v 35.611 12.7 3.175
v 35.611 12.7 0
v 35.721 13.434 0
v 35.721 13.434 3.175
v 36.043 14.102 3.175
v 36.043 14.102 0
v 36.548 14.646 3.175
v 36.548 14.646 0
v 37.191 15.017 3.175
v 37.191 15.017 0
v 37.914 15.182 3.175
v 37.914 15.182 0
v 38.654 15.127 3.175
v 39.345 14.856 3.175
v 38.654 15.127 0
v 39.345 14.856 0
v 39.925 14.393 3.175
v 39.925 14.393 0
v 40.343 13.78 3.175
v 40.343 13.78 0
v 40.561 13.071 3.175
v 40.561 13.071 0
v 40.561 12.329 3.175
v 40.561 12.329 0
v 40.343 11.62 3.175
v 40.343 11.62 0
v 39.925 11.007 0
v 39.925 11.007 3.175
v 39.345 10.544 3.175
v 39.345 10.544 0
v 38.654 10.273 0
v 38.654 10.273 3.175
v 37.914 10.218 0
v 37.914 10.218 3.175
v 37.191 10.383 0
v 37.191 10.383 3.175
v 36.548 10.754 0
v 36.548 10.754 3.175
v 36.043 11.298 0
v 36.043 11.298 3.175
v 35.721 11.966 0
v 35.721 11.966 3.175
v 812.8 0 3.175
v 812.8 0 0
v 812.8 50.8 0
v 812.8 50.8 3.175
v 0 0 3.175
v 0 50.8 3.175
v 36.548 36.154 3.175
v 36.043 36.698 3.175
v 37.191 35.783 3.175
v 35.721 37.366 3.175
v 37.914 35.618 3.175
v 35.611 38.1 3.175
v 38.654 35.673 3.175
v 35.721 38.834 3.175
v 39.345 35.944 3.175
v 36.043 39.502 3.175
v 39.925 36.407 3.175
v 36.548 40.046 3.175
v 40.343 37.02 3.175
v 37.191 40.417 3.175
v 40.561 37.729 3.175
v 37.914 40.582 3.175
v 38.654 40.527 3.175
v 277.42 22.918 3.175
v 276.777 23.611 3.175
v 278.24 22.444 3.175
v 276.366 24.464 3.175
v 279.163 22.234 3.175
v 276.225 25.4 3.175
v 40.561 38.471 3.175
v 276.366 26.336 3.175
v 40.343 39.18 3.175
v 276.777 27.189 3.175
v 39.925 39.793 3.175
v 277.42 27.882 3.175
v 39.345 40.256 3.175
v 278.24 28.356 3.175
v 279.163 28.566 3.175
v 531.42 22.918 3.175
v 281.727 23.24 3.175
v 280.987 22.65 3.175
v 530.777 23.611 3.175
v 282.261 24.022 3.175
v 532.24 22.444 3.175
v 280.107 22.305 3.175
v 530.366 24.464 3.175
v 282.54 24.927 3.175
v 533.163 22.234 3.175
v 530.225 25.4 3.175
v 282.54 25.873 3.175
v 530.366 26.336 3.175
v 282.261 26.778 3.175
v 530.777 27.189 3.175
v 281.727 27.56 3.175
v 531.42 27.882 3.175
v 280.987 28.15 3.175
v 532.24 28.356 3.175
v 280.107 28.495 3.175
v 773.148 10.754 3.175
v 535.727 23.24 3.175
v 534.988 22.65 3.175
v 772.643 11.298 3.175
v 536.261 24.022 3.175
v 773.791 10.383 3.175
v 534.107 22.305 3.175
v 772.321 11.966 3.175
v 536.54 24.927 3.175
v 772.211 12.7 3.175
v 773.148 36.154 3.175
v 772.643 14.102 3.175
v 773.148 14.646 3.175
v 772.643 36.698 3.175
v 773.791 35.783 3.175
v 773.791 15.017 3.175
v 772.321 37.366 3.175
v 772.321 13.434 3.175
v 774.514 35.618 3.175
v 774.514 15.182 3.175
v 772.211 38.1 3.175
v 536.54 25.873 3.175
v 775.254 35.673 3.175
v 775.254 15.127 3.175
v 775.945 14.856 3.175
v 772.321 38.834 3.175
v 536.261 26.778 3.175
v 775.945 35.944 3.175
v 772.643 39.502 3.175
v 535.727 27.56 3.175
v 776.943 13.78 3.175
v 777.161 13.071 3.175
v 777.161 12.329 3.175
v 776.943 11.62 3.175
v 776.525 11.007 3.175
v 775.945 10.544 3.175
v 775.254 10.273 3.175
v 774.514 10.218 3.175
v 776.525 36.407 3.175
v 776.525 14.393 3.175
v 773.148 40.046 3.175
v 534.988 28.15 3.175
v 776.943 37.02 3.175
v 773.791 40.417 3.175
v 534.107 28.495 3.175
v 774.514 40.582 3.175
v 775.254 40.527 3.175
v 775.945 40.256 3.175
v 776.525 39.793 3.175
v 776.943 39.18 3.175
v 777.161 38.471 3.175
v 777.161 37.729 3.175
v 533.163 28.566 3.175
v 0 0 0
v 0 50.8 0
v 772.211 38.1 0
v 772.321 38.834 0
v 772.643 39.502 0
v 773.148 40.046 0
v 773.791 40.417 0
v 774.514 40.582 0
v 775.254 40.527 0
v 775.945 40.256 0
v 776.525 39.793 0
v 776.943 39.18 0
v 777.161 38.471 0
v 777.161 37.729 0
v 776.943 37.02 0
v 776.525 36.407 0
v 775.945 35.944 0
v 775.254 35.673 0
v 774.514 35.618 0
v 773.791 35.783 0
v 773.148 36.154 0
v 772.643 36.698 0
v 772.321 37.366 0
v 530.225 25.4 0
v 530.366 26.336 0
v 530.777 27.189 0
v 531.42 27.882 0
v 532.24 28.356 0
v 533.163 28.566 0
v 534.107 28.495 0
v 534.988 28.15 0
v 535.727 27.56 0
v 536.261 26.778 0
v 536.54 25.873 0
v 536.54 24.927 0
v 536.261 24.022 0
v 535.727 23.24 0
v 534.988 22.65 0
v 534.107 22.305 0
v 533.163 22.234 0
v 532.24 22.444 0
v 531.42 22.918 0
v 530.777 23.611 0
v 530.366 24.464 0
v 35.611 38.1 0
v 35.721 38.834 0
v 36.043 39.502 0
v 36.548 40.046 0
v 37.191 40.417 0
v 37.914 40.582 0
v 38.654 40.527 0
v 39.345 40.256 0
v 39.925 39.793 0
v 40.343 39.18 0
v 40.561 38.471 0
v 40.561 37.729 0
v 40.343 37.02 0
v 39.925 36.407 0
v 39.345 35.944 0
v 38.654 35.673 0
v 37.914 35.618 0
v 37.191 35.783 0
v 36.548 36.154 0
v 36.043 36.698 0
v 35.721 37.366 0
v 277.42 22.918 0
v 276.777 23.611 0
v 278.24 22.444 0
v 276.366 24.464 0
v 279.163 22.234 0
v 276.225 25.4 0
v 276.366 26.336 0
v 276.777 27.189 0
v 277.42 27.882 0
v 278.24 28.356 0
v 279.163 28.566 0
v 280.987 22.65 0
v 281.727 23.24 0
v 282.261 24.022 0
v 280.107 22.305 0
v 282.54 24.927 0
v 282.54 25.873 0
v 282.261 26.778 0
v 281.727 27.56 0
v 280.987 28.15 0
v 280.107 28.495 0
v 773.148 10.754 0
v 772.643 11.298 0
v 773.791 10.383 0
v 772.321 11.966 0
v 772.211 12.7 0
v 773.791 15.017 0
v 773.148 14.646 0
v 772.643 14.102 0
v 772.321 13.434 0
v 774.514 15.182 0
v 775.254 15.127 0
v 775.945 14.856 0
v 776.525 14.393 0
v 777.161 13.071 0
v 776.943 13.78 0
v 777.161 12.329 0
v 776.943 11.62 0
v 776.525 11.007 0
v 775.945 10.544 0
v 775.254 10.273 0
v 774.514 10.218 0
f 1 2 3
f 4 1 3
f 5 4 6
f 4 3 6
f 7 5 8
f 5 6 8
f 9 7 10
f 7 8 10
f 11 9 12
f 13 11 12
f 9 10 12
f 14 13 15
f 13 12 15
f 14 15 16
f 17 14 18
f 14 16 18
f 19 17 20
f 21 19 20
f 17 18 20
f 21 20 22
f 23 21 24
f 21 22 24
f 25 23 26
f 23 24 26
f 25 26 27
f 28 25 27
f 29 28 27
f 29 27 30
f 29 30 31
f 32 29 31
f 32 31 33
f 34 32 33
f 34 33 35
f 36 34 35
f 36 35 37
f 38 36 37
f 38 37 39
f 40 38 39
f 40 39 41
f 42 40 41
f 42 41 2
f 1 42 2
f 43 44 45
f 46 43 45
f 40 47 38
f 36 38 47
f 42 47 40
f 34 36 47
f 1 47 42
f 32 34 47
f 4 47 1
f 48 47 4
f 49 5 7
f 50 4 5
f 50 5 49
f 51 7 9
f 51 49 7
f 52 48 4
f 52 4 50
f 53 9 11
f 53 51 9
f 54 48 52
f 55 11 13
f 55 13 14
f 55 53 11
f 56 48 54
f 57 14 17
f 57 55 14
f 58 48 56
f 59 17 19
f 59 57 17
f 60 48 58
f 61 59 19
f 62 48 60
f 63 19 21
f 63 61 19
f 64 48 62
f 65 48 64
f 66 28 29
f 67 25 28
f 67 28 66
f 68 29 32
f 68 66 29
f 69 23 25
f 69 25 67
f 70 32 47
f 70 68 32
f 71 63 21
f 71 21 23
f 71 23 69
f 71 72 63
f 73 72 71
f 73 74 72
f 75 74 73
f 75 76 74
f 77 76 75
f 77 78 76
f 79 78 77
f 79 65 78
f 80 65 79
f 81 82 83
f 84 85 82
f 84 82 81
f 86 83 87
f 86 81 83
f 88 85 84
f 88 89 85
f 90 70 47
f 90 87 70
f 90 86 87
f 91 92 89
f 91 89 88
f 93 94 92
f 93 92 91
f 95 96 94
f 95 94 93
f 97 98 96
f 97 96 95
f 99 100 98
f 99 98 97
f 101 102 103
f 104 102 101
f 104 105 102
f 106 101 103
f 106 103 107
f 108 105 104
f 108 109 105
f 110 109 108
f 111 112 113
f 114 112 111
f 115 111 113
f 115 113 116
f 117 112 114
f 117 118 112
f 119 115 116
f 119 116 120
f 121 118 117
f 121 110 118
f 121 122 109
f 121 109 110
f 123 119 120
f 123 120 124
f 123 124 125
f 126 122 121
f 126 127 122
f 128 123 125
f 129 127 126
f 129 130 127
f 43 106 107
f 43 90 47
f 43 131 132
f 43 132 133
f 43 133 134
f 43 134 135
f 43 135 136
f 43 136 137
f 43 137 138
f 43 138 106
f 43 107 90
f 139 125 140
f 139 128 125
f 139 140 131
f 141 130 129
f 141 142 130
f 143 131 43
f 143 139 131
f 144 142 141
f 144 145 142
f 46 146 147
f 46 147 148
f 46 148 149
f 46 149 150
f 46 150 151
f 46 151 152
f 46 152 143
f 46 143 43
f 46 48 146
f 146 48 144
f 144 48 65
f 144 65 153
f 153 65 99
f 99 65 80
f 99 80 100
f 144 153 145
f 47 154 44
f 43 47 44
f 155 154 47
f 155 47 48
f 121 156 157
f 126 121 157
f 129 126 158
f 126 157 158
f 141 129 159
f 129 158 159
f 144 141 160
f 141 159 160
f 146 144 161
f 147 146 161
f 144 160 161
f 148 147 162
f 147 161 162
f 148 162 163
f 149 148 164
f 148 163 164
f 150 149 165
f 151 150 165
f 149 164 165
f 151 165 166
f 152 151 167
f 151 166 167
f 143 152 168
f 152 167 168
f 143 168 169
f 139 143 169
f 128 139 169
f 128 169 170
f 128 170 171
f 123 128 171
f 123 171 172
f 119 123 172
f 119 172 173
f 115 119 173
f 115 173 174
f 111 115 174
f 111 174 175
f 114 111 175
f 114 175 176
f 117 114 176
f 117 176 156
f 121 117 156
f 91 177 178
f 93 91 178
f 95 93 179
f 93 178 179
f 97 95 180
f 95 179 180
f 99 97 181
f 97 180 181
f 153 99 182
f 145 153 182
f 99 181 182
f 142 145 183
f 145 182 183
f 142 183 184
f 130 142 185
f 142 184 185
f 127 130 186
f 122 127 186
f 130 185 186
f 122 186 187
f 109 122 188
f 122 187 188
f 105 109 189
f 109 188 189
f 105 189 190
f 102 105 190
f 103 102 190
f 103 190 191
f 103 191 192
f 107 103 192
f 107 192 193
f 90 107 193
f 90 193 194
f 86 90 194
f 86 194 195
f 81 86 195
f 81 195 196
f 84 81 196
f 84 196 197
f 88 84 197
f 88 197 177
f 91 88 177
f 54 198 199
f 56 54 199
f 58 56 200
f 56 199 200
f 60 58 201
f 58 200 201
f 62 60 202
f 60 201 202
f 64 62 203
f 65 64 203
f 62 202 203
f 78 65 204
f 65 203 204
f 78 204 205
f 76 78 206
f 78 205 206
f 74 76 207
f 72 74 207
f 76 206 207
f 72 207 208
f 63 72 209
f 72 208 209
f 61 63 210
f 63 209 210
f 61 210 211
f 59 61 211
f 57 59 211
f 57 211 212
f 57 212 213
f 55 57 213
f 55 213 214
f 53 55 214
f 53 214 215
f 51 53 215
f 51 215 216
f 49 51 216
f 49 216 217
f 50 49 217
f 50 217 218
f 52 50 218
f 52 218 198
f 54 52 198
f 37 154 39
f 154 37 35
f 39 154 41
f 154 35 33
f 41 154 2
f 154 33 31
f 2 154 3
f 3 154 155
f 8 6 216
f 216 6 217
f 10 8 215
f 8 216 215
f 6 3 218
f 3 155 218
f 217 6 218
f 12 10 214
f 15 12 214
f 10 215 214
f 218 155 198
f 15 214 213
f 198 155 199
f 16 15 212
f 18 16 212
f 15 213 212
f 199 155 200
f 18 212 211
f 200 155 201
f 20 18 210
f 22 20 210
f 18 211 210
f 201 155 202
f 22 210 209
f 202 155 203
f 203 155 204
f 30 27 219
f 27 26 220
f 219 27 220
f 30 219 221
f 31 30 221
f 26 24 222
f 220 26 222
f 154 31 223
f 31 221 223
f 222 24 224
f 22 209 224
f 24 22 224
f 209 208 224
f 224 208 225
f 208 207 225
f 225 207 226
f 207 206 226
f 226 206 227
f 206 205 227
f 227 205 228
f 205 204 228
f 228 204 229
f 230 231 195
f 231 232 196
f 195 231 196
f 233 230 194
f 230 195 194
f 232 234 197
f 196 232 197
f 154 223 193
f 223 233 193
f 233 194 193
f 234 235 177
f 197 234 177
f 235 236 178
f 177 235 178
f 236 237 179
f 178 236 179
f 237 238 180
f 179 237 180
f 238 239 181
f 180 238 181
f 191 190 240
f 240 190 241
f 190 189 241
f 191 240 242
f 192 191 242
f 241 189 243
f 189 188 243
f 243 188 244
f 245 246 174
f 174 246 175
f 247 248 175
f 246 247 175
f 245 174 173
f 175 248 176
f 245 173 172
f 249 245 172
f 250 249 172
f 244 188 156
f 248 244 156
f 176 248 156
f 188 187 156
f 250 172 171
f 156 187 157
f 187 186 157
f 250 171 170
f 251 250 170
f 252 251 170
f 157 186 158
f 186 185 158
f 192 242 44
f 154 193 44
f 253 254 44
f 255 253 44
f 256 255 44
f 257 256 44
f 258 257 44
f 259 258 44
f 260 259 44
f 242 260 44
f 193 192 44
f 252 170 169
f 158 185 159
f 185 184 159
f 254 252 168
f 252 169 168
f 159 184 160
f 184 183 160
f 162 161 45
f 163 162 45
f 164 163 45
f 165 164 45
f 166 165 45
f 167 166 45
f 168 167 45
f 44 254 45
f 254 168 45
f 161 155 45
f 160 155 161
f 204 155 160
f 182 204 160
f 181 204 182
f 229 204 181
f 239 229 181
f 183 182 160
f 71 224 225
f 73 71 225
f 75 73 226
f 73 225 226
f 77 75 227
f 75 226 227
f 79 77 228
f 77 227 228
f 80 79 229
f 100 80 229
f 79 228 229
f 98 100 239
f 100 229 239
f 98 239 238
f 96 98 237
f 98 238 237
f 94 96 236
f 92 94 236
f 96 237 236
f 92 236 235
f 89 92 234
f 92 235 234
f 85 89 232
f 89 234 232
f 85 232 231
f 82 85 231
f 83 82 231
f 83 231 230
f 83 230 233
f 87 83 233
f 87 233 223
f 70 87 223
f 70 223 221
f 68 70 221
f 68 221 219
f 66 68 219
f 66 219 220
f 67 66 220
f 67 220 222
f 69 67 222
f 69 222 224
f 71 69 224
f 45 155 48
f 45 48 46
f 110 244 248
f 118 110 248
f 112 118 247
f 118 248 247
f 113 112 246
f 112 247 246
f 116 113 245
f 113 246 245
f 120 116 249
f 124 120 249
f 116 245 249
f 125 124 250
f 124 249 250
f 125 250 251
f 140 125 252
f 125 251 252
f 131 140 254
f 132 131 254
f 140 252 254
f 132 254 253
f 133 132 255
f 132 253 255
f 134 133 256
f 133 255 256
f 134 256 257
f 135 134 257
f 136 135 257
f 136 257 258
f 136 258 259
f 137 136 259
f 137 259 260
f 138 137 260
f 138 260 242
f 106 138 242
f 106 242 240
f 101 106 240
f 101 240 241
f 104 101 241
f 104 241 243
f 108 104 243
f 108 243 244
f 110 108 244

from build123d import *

# Parameters (mm, degrees)
SKETCH1_W           = 812.8
SKETCH1_H           = 50.8
BOSS_EXTRUDE1_DEPTH = 3.175
SKETCH2_R           = 3.175
SKETCH2_R_2         = 2.4892
CUT_EXTRUDE1_DEPTH  = 4.175


with BuildPart() as part:
    # Sketch1 → Boss-Extrude1 (new body)
    with BuildSketch(Plane.XY):
        with Locations((406.4, 25.4)):
            Rectangle(SKETCH1_W, SKETCH1_H)
    extrude(amount=BOSS_EXTRUDE1_DEPTH)

    # Sketch2 → Cut-Extrude1 (cut, through all)
    with BuildSketch(Plane(origin=(0, 0, 0), x_dir=(-1, 0, 0), z_dir=(0, 0, -1))):
        with Locations((-533.4, 25.4)):
            Circle(SKETCH2_R)
        with Locations((-279.4, 25.4)):
            Circle(SKETCH2_R)
        with Locations((-38.1, 12.7)):
            Circle(SKETCH2_R_2)
        with Locations((-38.1, 38.1)):
            Circle(SKETCH2_R_2)
        with Locations((-774.7, 12.7)):
            Circle(SKETCH2_R_2)
        with Locations((-774.7, 38.1)):
            Circle(SKETCH2_R_2)
    extrude(amount=-CUT_EXTRUDE1_DEPTH, mode=Mode.SUBTRACT)


solid = part.part
